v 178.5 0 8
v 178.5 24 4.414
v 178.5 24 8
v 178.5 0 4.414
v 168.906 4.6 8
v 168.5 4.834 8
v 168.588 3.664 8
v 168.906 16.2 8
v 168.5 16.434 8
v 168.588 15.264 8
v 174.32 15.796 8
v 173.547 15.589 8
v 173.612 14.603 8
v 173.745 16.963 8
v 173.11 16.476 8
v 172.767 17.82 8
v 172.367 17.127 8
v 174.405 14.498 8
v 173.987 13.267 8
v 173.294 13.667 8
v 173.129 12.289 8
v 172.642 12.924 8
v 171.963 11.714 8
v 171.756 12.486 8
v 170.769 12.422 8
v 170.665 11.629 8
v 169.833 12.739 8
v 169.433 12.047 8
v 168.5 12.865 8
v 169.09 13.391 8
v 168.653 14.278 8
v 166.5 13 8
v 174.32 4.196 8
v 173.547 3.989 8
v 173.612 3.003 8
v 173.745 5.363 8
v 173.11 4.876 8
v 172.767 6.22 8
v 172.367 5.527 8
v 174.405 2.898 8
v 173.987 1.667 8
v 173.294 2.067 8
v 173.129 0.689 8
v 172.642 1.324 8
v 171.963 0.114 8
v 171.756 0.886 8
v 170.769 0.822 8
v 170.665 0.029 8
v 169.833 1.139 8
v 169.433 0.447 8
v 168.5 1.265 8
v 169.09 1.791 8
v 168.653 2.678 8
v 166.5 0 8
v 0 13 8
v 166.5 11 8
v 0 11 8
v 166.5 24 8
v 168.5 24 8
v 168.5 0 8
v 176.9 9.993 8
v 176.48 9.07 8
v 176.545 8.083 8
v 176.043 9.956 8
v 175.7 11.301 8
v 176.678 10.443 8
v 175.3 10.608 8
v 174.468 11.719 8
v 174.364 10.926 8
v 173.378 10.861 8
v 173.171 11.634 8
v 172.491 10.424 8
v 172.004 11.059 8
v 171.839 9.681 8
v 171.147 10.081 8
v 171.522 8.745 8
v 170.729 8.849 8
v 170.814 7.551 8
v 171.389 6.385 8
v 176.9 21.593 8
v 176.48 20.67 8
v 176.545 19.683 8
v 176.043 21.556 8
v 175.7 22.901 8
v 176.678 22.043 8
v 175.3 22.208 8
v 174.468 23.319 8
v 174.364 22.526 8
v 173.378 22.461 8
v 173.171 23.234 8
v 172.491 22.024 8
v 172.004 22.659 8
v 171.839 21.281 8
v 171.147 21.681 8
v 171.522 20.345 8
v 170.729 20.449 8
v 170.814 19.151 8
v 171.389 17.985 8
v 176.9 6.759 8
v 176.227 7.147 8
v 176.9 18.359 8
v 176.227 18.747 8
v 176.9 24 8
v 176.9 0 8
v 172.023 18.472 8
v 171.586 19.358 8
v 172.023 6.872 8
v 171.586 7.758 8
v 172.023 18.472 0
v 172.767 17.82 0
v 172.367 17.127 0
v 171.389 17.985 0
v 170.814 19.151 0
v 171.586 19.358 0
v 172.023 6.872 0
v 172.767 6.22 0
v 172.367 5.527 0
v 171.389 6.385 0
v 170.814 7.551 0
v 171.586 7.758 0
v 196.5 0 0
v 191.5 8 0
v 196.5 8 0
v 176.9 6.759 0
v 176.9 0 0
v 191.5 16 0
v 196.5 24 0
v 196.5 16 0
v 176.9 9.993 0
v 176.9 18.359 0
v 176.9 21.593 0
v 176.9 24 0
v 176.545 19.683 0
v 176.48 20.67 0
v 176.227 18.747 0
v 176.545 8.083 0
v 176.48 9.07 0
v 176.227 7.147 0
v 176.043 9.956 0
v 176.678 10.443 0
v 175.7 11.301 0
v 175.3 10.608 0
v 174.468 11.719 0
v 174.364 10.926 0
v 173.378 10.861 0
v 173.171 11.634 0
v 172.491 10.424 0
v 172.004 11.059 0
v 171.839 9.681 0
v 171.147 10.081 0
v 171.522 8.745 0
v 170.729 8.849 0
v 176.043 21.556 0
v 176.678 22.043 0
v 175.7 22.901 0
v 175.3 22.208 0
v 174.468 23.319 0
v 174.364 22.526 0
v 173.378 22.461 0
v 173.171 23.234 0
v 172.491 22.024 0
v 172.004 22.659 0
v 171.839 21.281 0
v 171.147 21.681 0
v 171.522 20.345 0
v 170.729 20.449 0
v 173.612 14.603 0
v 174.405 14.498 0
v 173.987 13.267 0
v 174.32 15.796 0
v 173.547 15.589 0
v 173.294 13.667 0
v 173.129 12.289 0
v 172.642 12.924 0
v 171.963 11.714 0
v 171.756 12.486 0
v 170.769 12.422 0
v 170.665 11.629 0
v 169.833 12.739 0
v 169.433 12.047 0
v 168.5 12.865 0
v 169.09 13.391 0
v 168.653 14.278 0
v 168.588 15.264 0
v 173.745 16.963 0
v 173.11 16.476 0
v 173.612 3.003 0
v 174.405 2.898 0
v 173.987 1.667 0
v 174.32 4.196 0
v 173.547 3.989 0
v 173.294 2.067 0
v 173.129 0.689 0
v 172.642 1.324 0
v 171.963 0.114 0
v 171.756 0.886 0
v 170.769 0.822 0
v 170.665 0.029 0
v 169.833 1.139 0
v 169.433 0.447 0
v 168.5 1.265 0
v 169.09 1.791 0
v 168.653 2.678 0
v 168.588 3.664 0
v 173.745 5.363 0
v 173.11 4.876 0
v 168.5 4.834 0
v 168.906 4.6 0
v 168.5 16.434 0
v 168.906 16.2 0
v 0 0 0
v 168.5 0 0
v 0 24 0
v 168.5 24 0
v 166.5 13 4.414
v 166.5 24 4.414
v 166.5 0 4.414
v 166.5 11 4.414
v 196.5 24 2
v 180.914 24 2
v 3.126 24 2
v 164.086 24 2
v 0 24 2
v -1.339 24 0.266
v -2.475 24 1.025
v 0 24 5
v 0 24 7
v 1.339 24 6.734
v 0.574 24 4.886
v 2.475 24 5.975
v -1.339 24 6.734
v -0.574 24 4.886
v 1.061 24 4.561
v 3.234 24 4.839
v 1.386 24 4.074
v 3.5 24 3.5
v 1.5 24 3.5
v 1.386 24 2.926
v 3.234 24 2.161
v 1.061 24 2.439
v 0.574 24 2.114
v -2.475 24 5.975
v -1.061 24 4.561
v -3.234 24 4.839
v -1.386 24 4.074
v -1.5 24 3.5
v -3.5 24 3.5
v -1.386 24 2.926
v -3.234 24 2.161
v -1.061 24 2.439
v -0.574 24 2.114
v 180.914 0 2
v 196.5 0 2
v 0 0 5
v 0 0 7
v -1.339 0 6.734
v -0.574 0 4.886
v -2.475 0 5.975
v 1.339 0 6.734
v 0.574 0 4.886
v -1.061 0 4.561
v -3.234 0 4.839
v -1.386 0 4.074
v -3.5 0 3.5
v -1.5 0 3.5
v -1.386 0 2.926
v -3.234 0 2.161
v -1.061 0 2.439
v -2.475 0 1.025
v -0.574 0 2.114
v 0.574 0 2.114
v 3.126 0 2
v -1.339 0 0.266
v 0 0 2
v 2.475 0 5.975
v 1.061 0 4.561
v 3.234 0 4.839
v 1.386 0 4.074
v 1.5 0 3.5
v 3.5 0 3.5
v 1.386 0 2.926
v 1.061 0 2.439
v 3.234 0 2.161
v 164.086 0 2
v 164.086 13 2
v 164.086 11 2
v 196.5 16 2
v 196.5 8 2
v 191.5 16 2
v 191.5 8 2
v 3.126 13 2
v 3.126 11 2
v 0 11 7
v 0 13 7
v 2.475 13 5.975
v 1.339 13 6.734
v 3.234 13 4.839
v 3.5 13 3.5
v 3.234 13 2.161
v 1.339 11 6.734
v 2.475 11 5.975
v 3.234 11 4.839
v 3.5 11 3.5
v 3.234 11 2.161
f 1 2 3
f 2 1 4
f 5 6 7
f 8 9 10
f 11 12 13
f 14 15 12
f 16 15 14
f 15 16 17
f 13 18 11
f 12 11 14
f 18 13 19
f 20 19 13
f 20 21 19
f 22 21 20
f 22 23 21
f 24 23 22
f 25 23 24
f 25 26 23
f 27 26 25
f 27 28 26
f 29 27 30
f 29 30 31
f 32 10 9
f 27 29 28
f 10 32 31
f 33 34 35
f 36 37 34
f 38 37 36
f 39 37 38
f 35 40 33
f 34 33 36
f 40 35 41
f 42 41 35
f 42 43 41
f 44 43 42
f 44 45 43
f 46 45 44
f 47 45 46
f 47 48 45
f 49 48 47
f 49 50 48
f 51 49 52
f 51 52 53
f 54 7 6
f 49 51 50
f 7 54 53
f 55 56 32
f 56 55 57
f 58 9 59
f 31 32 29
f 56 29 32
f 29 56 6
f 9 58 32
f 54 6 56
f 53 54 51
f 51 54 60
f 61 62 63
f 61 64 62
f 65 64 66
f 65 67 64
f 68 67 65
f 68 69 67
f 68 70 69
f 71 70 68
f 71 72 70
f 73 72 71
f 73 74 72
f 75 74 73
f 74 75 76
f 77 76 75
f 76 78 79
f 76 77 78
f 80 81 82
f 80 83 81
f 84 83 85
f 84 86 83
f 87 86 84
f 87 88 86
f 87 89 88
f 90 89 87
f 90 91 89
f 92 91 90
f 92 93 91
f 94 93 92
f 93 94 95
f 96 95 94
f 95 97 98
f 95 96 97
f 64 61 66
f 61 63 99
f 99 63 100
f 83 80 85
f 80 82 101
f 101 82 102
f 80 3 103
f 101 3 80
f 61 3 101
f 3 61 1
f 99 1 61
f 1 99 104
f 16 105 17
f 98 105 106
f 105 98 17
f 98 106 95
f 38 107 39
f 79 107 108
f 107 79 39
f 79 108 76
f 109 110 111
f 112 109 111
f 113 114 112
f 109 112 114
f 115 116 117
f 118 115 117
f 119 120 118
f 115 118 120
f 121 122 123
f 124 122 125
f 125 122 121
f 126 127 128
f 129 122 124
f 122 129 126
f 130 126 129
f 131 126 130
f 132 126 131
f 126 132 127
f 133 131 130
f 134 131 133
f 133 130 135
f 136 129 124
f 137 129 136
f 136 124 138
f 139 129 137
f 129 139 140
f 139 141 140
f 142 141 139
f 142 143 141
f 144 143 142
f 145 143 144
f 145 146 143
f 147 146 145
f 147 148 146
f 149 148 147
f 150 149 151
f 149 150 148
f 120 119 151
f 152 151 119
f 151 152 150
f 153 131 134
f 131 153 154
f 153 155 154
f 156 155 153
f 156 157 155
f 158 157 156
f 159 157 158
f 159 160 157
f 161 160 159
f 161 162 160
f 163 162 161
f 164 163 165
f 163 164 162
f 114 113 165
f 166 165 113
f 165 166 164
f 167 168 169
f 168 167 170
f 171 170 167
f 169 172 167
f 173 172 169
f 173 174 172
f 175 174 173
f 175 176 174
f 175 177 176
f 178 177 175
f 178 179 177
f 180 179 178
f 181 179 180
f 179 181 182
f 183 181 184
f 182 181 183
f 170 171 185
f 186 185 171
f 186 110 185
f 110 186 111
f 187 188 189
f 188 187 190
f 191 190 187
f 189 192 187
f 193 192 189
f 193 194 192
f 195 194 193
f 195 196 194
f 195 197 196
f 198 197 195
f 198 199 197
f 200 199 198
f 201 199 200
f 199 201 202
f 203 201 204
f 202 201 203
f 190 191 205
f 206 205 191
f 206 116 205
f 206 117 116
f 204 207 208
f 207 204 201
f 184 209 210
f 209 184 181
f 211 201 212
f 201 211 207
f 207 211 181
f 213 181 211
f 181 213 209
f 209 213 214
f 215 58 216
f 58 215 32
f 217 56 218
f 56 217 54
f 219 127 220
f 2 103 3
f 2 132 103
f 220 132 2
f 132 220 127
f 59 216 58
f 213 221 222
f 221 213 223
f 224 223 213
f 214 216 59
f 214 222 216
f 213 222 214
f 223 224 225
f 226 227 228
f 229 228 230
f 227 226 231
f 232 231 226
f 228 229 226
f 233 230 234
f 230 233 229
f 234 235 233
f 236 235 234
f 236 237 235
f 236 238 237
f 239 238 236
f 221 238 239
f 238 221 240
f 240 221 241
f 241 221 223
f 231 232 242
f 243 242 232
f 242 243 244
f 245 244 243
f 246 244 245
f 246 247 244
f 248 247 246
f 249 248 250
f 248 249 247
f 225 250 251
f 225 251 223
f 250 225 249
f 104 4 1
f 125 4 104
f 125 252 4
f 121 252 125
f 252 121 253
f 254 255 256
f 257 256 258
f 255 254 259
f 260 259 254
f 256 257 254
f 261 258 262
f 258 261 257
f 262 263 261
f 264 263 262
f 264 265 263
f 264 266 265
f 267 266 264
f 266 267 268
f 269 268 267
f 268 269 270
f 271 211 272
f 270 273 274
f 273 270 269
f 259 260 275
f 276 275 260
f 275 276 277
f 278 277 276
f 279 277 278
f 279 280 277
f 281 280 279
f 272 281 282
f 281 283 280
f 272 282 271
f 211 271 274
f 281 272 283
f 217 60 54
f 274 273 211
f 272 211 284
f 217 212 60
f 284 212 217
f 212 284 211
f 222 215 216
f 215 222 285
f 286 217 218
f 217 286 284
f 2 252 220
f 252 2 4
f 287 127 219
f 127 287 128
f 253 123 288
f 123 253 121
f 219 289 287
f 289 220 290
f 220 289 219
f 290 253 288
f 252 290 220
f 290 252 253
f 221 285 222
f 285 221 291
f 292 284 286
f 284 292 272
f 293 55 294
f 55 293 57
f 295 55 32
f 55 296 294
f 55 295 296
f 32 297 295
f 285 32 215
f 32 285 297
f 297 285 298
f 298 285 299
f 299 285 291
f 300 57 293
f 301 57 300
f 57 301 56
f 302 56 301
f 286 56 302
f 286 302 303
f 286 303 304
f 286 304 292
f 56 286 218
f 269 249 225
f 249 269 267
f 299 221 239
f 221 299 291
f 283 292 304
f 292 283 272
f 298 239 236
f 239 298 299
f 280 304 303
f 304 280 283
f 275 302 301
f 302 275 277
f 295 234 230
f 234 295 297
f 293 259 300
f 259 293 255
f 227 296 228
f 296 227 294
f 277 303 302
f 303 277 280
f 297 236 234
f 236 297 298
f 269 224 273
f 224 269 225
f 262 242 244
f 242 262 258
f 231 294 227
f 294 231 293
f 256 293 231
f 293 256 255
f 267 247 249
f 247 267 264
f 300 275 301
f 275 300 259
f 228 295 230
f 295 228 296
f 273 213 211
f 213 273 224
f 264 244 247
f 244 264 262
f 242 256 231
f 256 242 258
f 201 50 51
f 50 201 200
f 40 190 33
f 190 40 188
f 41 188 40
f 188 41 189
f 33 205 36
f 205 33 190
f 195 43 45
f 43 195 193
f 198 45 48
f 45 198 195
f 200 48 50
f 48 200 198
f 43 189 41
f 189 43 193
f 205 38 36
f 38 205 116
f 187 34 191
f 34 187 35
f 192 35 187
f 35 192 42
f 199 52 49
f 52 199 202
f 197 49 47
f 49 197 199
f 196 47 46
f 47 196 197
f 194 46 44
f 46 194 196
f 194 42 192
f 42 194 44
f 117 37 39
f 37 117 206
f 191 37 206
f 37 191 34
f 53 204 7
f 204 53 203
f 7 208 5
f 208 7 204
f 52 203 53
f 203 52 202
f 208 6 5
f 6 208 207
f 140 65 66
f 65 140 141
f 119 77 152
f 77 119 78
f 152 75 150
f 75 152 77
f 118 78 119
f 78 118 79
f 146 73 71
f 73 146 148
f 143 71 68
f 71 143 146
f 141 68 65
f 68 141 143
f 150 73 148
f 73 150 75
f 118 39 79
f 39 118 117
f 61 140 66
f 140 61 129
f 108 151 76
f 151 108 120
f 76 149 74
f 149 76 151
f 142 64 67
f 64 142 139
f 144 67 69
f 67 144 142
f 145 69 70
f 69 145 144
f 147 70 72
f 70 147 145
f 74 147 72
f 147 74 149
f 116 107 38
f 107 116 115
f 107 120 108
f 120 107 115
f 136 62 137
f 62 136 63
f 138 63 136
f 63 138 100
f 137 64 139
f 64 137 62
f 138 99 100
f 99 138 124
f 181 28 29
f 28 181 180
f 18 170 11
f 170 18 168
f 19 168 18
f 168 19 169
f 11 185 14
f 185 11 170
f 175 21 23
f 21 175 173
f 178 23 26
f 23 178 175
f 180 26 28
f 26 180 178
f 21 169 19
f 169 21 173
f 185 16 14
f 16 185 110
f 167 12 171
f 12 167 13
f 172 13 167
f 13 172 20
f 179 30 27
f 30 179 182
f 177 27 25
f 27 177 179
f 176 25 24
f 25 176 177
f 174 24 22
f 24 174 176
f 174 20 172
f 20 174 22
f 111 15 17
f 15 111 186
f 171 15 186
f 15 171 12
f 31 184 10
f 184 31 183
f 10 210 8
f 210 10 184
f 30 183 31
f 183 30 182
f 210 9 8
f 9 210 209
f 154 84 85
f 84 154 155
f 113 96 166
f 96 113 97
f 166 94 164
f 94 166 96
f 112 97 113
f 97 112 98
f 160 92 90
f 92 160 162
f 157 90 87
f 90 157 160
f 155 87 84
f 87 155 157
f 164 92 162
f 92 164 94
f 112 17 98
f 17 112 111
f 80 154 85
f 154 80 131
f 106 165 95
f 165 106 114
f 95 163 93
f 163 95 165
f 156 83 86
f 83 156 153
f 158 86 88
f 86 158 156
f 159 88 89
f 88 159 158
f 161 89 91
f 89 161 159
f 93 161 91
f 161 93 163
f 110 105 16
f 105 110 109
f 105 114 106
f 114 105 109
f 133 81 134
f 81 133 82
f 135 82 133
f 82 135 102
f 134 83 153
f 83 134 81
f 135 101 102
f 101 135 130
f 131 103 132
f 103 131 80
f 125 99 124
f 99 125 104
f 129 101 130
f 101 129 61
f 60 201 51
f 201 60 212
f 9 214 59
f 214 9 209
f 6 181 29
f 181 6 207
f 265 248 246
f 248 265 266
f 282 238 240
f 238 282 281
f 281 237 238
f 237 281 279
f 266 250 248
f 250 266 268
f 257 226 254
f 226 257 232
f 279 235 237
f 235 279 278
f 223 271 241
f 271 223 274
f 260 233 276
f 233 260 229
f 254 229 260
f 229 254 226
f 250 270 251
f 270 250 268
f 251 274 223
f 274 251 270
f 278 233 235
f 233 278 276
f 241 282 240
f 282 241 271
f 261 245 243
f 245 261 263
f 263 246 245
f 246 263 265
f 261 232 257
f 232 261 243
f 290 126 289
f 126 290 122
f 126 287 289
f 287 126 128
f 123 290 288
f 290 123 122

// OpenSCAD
min_fn = 16;

door_w = 24;
door_th = 2;
tab_th = 2; 
door_ir = 3/2;
door_or = 7/2;
door_l = 198 - door_ir;

tab_clr = 10;
tab_h = 8;

tab_x = door_l - tab_clr * 3;

spring_th = 0.8;

module spring_half(r=tab_clr/3) {
    difference() {
        cylinder(r=r, h=tab_h, $fn=min_fn);
        cylinder(r=r-spring_th, h=tab_h+1, $fn=min_fn);
        translate([-r, 0, 0])
            cube([r, r, tab_h+1]);
    }
}

// ! spring_half();

module spring(r=tab_clr/3) {
    spring_half();
    translate([0, r*2 - spring_th, 0])
        rotate([0, 0, 180])
        spring_half(r=r);
    // translate([tab_clr/4, tab_clr/2 - 2*spring_th, 0])
    //     spring_half(tab_clr/4-spring_th);
    // # translate([tab_clr/4, tab_clr/2 + spring_th, 0])
    //     rotate([0, 0, 180])
    //     spring_half(tab_clr/4-spring_th);
    
}

// ! spring();

module tab_spring_core() {
    // rotate([0, 4, 0])
    //     cube([tab_clr/2, l, tab_h + door_or]);
    // translate([tab_clr/4, 0, 0])
    //     cube([tab_clr/2, l, tab_h + door_or]);
    // translate([tab_clr/2 + 1/2, 0, 0])
    //     rotate([0, -4, 0])
    //     cube([tab_clr/3, l, tab_h + door_or]);
    // translate([tab_clr/2, 0, door_or + tab_h])
    //     rotate([-90, 0, 0])
    //     cylinder(h=l, r=tab_clr/4, center=false, $fn=min_fn);
    difference() {
        // % cube([tab_clr * 2, door_w, tab_h]);
        translate([door_th, 0, 0])
            cube([tab_clr - 2*spring_th, door_w, tab_h+1]);
        for (y=[tab_clr/3:tab_clr + spring_th*2:door_w])
            translate([tab_clr/2 - spring_th/2, y, 0])
            rotate([0, 0, -30])
                spring();
        // difference() {
        //     translate([tab_clr, tab_clr, 0])
        //         cylinder(r=tab_clr/4+1, h=tab_h+1, $fn=min_fn);
        //     translate([tab_clr, tab_clr, 0])
        //         cylinder(r=tab_clr/4, h=tab_h+1, $fn=min_fn);
        // }
    }
    
}

// ! tab_spring_core();

module tab_spring() {
    cube([tab_clr + door_th, door_w, tab_h]);
    translate([-.5, door_w/2, door_th+.5])
        rotate([0, 45, 0])
        cube([door_th, door_w, 2*door_th], center=true);
    translate([tab_clr + door_th + 0.5, door_w/2, door_th+.5])
        rotate([0, -45, 0])
        cube([door_th, door_w, 2*door_th], center=true);
    // translate([tab_clr + door_th, 0, tab_h/2])
    //     rotate([-90, 0, 0])
    //     cylinder(r=tab_h/2, h=door_w, $fn=min_fn);
    // % tab_spring_core();
    // minkowski() {
    //     tab_spring_core(door_w - 1);
    //     // translate([-door_th, 0, 0])
    //         // cube([2*door_th, 0.01, door_th]);
    //     translate([0, 0, door_th + 1.1])
    //         rotate([-90, 0, 0])
    //             cylinder(h=1, r=door_th, center=false, $fn=min_fn);
    // }
    // translate([-door_th, 0, door_th])
    //     rotate([-90, 0, 0])
    //     cylinder(h=door_w, r=door_th, center=false, $fn=min_fn);
    // translate([tab_clr + door_th, 0, door_th])
    //     rotate([-90, 0, 0])
    //     cylinder(h=door_w, r=door_th, center=false, $fn=min_fn);
    // % translate([-tab_x, 0, 0])
    //     cube([door_l, door_w, door_th]);
}


// ! tab_spring();

module roomba_door() {
    difference() {
        union() {
            cube([door_l, door_w, door_th]);
            translate([0, door_w/2 - door_th/2, 0])
                cube([tab_x, door_th, tab_h]);
            translate([0, 0, door_or])
                rotate([-90, 0, 0])
                cylinder(h=door_w, r=door_or, center=false, $fn=min_fn);
            translate([tab_x, 0, 0])
                tab_spring();
        }
        translate([0, 0, door_or])
            rotate([-90, 0, 0])
                cylinder(h=door_w*3, r=door_ir, center=true, $fn=min_fn);
        translate([tab_x, 0, 0])
            tab_spring_core();
        // translate([tab_x, -door_w/2, door_th])
        //     tab_spring_core(door_w*2);
        # translate([door_l - tab_clr/4, door_w/2, door_th/2])
            cube([
                tab_clr/2, door_w - 2*tab_h, door_th],
                center=true);       
    }
}

module hinge_joint() {
    translate([100, 0, 0])
        cube([25, door_w, tab_h]);
}

// ! hinge_joint();

module clip_joint(clr=0) {
    // translate([100, 0, 0])
    //     cube([30, door_w, tab_h+door_th]);
    // translate([90, 0, door_th])
    //     cube([30, door_w, door_th]);
    translate([80, 0, 0])
        cube([20, door_w, tab_h]);
    for (y=[door_w/4, 3*door_w/4])
        translate([80, y, -1])
        intersection() {
            rotate([45, 0, 0])
                cube([40, 2*door_or + clr, 2*door_or + clr]);
            translate([0, -door_or, 1])
                cube([40, 2*door_or + clr, 2*door_or + clr]);
        }
            
}

// ! clip_joint();

module screws() {
    for (x=[105, 115])
        for (y=[door_w/4, 3*door_w/4])
        translate([x, y, 0])
            cylinder(r=3/2, h=30, center=true, $fn=min_fn);
}


module door_clip(screws=true, clr=0) {
    difference() {
        union() {
            difference() {
                // union() {
                    roomba_door();
                    // clip_joint();
                // }
                // # translate([100, -1, 0])
                //     cube([door_l, door_w+2, door_th]); 
                translate([100, -1, -1])
                    cube([door_l, door_w+2, door_w+2]);   
            }
            clip_joint(clr=clr);
        }
        if (screws)
            screws();
    }
}

// ! door_clip();

module door_hinge() {
    difference() {
        union() {
            roomba_door();
            hinge_joint();
        }
        // # translate([0, -1, 0])
        //     cube([100, door_w+2, door_th]); 
        translate([-10, -1, -1])
            cube([110, door_w+2, door_w+2]);
        door_clip(false);
        screws();
        // clip_joint();
        // translate([120, -1, -1])
        //     cube([door_l, door_w+2, door_w+2]);
    }
}

// ! door_hinge();

module design() {
    roomba_door();
    // translate([0, 0, 0])
    //     door_hinge();
    // translate([0, 30, 0])
    //     door_clip(clr=-0.5);

    // % translate([0, -30, 0])
    //     roomba_door();
    // % cube(150);
}

design();

// module test () {
//     % clip_joint(clr=0);
//     clip_joint(clr=-.5);
// }

// ! test();
